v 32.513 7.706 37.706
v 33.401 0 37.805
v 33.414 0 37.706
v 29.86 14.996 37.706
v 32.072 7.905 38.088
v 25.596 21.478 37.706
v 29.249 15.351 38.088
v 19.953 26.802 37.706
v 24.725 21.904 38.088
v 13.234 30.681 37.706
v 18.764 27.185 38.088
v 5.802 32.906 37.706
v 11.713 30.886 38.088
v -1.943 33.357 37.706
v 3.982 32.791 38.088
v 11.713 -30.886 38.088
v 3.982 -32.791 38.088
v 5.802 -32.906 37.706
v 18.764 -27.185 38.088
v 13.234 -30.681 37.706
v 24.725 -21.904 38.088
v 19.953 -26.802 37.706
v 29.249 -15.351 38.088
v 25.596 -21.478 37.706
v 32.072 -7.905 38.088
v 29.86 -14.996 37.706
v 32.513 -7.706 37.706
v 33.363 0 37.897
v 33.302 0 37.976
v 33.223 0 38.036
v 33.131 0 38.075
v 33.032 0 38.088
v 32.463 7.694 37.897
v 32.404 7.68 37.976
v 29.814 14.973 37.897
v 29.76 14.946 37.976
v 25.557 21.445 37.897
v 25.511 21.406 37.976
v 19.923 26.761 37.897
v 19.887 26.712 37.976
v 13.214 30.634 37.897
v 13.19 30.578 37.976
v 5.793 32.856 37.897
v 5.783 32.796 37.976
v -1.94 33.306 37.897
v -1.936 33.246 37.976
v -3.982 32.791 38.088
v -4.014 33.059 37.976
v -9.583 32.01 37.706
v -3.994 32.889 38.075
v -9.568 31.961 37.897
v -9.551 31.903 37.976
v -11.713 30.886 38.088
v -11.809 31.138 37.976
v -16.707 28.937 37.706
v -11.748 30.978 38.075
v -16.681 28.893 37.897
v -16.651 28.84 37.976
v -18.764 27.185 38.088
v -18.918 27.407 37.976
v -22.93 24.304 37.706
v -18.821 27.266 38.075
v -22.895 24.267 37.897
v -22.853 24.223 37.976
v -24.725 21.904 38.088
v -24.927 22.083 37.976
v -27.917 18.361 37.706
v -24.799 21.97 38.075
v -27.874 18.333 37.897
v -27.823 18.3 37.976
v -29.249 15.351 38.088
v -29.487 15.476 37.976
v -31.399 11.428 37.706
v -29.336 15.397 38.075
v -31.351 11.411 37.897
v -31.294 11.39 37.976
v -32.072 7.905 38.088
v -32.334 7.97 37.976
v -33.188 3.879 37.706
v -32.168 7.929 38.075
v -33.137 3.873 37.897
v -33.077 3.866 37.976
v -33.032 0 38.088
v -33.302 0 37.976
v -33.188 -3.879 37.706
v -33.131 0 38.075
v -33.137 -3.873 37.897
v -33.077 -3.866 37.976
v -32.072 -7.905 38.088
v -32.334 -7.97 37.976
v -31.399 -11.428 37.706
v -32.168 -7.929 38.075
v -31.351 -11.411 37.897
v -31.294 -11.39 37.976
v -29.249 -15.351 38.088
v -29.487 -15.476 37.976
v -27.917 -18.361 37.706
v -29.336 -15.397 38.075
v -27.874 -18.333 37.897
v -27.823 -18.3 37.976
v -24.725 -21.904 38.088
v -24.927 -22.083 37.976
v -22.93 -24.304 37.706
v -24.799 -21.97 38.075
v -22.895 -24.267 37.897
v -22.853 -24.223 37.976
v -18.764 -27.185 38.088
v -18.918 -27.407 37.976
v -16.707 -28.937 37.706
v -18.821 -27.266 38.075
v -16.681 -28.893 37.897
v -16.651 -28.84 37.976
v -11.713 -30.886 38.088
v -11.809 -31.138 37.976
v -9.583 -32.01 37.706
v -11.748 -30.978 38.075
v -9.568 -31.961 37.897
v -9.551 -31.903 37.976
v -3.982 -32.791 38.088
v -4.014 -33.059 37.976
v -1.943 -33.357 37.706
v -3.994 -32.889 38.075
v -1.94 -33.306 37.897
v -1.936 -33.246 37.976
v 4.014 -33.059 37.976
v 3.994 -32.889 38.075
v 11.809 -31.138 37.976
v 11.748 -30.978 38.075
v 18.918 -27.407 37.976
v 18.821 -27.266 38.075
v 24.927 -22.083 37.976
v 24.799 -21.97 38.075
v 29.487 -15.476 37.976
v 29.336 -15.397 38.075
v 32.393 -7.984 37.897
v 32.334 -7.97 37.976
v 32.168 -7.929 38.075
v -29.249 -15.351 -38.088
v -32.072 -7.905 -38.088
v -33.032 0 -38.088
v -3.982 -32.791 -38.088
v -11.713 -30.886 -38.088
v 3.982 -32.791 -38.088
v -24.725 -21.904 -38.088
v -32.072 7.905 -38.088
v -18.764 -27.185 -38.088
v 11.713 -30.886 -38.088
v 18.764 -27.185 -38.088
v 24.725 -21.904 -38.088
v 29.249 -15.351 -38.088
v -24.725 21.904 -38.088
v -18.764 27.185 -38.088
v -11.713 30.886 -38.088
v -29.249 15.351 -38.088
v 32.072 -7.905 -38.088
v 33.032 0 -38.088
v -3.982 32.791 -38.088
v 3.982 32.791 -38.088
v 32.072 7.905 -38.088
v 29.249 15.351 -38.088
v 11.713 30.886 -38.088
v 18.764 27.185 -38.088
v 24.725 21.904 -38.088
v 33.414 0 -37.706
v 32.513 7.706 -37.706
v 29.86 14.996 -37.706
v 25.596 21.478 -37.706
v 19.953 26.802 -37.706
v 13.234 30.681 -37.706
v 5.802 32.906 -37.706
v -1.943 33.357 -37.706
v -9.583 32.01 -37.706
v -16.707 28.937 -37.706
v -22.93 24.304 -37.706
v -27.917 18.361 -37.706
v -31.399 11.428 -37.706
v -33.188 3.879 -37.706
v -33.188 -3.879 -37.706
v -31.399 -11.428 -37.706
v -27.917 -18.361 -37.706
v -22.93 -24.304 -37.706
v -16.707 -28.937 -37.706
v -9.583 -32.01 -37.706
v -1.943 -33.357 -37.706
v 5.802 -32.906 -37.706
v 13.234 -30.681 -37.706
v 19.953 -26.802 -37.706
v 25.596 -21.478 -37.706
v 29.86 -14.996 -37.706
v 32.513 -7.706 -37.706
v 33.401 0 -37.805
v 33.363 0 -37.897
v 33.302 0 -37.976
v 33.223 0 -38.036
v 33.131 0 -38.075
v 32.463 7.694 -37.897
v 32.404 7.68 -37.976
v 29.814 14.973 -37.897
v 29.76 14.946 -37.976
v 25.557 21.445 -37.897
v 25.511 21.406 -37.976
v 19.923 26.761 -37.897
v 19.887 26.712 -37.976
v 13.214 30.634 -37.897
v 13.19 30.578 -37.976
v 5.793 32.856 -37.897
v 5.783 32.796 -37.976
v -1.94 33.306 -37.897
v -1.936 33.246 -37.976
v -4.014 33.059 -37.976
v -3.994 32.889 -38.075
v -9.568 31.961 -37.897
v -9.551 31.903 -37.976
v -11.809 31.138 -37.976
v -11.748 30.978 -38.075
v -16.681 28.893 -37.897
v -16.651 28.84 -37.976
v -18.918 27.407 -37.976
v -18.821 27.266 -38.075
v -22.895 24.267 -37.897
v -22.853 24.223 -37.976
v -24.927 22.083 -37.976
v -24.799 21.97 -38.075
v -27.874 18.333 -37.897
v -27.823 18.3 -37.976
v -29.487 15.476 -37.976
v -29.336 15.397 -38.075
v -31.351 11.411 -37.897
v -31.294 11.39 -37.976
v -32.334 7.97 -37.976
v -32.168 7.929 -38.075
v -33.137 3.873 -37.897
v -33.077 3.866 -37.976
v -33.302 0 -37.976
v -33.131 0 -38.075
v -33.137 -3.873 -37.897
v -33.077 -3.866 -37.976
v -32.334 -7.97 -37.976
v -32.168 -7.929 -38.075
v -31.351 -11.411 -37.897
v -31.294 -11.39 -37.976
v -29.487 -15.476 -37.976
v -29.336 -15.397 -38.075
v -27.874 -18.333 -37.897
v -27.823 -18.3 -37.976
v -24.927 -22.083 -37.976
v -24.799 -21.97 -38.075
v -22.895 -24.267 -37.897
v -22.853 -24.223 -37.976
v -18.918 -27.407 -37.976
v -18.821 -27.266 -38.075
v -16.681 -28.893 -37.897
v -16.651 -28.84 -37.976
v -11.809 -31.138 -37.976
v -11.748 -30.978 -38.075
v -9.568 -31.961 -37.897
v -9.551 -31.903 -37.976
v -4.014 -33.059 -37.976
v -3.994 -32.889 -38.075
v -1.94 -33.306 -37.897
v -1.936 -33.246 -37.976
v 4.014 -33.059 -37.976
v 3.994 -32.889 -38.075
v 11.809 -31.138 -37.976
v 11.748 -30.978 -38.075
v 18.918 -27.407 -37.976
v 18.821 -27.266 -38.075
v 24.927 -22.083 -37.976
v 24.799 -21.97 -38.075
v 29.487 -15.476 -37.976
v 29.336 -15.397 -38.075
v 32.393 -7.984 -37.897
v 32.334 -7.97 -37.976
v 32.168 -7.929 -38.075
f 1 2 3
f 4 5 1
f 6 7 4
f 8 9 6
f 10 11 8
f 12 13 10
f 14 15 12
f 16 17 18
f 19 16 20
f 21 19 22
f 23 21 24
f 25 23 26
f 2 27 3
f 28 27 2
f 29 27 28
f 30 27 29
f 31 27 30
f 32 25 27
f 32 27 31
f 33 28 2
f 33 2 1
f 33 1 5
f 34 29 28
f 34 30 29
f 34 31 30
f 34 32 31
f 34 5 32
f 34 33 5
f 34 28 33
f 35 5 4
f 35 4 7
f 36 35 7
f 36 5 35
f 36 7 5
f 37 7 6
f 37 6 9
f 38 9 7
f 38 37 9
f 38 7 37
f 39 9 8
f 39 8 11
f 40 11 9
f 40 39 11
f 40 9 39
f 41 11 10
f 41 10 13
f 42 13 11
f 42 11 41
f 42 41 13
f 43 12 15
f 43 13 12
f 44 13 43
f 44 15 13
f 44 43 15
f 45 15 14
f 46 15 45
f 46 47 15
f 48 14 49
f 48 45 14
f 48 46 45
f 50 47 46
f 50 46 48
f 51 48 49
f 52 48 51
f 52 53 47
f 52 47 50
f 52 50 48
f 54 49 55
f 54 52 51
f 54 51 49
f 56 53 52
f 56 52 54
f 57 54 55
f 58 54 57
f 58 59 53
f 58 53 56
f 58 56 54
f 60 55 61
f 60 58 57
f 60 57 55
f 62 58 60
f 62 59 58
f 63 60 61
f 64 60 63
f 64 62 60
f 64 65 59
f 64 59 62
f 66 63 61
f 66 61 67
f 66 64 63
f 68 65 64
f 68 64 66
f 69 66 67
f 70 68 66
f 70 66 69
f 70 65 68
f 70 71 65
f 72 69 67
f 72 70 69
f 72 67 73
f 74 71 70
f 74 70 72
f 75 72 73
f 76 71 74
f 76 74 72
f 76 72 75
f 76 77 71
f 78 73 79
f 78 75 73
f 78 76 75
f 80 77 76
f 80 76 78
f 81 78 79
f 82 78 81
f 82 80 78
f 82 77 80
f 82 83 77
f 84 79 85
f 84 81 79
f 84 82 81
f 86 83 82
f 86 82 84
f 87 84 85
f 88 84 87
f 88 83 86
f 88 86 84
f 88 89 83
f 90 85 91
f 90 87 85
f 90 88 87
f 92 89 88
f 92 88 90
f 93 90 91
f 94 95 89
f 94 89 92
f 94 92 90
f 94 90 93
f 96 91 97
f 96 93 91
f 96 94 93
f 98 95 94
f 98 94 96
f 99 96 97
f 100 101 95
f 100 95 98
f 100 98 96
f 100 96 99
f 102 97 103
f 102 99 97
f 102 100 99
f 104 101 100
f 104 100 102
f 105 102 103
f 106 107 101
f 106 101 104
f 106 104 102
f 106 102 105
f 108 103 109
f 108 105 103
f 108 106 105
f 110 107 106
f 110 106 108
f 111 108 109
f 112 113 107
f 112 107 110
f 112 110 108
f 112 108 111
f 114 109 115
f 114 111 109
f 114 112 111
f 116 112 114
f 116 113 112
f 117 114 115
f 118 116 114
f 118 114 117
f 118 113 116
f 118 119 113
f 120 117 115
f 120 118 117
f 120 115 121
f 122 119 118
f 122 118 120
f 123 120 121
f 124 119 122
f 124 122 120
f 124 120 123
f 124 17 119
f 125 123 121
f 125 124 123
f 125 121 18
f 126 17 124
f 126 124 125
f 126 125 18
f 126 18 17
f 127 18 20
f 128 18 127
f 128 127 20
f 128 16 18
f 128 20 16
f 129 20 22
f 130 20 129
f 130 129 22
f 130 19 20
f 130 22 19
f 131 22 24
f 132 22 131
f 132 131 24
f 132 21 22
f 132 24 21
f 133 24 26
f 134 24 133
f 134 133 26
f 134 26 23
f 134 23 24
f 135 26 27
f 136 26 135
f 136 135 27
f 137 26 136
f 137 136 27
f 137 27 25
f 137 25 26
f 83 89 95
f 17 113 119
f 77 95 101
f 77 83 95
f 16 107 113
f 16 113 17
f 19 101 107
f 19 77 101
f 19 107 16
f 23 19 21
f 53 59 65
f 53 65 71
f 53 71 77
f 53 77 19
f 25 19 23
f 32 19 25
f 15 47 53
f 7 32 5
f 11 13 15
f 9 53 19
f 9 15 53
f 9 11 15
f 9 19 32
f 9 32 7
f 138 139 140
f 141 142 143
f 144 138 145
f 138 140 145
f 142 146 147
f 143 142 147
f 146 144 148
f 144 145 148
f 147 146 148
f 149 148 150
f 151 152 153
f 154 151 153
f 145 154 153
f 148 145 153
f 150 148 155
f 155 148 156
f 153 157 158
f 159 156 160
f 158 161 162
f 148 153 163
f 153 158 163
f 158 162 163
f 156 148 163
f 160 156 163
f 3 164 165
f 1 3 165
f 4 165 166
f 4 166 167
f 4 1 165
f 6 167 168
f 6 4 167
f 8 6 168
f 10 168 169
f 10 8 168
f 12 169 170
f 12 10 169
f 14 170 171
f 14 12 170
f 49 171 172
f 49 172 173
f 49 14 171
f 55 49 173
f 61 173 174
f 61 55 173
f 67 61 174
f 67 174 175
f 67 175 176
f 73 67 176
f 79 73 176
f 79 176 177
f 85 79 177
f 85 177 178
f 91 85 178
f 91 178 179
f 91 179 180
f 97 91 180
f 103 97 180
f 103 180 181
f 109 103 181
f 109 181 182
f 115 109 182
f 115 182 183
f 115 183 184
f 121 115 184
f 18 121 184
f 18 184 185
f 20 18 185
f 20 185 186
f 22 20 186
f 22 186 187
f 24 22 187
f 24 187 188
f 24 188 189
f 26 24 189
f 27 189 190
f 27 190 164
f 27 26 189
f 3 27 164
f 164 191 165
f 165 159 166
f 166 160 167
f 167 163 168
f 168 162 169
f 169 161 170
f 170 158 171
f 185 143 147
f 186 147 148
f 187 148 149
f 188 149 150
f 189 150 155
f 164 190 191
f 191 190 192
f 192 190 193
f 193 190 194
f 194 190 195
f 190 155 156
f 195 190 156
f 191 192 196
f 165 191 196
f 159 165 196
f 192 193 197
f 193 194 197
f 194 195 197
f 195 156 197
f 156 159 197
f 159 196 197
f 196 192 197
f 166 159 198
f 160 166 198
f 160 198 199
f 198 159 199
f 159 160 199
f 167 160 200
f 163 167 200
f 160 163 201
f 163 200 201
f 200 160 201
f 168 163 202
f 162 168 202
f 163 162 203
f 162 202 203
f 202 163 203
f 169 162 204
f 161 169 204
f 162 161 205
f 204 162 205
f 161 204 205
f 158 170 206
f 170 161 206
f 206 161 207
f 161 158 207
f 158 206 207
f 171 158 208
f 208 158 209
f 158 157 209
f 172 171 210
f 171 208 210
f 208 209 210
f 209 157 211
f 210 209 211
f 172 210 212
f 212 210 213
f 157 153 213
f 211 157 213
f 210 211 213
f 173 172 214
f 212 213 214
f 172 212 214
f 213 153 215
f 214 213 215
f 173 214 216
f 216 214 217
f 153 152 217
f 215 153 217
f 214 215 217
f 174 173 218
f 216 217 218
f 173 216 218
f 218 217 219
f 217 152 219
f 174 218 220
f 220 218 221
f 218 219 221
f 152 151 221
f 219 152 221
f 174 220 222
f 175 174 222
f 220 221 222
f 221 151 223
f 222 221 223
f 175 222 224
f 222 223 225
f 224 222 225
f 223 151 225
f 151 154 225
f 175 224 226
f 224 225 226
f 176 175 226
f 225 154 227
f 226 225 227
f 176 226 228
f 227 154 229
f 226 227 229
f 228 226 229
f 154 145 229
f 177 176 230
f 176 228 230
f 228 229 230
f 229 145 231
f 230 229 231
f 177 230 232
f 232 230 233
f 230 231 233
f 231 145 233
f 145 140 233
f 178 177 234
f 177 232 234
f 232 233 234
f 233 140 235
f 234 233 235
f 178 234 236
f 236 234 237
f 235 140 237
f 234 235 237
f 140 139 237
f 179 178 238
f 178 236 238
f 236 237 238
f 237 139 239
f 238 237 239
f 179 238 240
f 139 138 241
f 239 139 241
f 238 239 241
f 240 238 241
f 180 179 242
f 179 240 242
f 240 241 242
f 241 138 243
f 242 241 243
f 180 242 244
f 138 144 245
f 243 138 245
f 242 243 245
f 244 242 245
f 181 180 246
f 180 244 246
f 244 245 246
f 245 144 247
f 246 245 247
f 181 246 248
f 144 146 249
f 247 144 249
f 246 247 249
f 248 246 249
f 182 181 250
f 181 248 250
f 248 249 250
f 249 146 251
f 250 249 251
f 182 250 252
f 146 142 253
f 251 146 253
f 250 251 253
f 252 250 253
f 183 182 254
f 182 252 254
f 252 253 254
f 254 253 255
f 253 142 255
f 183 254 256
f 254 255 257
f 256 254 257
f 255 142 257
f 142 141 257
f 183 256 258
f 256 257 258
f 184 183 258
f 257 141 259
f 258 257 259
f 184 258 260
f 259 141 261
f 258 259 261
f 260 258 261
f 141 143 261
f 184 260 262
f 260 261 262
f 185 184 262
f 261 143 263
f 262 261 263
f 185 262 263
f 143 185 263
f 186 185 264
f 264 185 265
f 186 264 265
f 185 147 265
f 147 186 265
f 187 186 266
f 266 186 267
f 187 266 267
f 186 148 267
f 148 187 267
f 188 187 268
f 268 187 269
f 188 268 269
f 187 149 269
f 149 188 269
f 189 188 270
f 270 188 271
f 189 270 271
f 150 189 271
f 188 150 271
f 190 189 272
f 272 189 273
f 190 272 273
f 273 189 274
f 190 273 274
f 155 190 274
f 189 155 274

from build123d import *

# Parameters (mm, degrees)
F0_R     = 33.4136580184
F1_DEPTH = 38.0875840783
F3_R     = 0.3813665803


with BuildPart() as f1:
    # F0 (on Top) → F1 (new body)
    with BuildSketch(Plane.XY):
        Circle(F0_R)
    extrude(amount=F1_DEPTH)

    # F2: F1 across plane


with BuildPart() as f1_1:
    add(f1.part)
    add(f1.part.mirror(Plane.XY))

    # F3
    f3_edges = [f1_1.edges().sort_by_distance(p)[0] for p in [
        (-33.413658, 0, -38.087584),
        (-33.413658, 0, 38.087584),
    ]]
    fillet(f3_edges, radius=F3_R)


solid = f1_1.part
